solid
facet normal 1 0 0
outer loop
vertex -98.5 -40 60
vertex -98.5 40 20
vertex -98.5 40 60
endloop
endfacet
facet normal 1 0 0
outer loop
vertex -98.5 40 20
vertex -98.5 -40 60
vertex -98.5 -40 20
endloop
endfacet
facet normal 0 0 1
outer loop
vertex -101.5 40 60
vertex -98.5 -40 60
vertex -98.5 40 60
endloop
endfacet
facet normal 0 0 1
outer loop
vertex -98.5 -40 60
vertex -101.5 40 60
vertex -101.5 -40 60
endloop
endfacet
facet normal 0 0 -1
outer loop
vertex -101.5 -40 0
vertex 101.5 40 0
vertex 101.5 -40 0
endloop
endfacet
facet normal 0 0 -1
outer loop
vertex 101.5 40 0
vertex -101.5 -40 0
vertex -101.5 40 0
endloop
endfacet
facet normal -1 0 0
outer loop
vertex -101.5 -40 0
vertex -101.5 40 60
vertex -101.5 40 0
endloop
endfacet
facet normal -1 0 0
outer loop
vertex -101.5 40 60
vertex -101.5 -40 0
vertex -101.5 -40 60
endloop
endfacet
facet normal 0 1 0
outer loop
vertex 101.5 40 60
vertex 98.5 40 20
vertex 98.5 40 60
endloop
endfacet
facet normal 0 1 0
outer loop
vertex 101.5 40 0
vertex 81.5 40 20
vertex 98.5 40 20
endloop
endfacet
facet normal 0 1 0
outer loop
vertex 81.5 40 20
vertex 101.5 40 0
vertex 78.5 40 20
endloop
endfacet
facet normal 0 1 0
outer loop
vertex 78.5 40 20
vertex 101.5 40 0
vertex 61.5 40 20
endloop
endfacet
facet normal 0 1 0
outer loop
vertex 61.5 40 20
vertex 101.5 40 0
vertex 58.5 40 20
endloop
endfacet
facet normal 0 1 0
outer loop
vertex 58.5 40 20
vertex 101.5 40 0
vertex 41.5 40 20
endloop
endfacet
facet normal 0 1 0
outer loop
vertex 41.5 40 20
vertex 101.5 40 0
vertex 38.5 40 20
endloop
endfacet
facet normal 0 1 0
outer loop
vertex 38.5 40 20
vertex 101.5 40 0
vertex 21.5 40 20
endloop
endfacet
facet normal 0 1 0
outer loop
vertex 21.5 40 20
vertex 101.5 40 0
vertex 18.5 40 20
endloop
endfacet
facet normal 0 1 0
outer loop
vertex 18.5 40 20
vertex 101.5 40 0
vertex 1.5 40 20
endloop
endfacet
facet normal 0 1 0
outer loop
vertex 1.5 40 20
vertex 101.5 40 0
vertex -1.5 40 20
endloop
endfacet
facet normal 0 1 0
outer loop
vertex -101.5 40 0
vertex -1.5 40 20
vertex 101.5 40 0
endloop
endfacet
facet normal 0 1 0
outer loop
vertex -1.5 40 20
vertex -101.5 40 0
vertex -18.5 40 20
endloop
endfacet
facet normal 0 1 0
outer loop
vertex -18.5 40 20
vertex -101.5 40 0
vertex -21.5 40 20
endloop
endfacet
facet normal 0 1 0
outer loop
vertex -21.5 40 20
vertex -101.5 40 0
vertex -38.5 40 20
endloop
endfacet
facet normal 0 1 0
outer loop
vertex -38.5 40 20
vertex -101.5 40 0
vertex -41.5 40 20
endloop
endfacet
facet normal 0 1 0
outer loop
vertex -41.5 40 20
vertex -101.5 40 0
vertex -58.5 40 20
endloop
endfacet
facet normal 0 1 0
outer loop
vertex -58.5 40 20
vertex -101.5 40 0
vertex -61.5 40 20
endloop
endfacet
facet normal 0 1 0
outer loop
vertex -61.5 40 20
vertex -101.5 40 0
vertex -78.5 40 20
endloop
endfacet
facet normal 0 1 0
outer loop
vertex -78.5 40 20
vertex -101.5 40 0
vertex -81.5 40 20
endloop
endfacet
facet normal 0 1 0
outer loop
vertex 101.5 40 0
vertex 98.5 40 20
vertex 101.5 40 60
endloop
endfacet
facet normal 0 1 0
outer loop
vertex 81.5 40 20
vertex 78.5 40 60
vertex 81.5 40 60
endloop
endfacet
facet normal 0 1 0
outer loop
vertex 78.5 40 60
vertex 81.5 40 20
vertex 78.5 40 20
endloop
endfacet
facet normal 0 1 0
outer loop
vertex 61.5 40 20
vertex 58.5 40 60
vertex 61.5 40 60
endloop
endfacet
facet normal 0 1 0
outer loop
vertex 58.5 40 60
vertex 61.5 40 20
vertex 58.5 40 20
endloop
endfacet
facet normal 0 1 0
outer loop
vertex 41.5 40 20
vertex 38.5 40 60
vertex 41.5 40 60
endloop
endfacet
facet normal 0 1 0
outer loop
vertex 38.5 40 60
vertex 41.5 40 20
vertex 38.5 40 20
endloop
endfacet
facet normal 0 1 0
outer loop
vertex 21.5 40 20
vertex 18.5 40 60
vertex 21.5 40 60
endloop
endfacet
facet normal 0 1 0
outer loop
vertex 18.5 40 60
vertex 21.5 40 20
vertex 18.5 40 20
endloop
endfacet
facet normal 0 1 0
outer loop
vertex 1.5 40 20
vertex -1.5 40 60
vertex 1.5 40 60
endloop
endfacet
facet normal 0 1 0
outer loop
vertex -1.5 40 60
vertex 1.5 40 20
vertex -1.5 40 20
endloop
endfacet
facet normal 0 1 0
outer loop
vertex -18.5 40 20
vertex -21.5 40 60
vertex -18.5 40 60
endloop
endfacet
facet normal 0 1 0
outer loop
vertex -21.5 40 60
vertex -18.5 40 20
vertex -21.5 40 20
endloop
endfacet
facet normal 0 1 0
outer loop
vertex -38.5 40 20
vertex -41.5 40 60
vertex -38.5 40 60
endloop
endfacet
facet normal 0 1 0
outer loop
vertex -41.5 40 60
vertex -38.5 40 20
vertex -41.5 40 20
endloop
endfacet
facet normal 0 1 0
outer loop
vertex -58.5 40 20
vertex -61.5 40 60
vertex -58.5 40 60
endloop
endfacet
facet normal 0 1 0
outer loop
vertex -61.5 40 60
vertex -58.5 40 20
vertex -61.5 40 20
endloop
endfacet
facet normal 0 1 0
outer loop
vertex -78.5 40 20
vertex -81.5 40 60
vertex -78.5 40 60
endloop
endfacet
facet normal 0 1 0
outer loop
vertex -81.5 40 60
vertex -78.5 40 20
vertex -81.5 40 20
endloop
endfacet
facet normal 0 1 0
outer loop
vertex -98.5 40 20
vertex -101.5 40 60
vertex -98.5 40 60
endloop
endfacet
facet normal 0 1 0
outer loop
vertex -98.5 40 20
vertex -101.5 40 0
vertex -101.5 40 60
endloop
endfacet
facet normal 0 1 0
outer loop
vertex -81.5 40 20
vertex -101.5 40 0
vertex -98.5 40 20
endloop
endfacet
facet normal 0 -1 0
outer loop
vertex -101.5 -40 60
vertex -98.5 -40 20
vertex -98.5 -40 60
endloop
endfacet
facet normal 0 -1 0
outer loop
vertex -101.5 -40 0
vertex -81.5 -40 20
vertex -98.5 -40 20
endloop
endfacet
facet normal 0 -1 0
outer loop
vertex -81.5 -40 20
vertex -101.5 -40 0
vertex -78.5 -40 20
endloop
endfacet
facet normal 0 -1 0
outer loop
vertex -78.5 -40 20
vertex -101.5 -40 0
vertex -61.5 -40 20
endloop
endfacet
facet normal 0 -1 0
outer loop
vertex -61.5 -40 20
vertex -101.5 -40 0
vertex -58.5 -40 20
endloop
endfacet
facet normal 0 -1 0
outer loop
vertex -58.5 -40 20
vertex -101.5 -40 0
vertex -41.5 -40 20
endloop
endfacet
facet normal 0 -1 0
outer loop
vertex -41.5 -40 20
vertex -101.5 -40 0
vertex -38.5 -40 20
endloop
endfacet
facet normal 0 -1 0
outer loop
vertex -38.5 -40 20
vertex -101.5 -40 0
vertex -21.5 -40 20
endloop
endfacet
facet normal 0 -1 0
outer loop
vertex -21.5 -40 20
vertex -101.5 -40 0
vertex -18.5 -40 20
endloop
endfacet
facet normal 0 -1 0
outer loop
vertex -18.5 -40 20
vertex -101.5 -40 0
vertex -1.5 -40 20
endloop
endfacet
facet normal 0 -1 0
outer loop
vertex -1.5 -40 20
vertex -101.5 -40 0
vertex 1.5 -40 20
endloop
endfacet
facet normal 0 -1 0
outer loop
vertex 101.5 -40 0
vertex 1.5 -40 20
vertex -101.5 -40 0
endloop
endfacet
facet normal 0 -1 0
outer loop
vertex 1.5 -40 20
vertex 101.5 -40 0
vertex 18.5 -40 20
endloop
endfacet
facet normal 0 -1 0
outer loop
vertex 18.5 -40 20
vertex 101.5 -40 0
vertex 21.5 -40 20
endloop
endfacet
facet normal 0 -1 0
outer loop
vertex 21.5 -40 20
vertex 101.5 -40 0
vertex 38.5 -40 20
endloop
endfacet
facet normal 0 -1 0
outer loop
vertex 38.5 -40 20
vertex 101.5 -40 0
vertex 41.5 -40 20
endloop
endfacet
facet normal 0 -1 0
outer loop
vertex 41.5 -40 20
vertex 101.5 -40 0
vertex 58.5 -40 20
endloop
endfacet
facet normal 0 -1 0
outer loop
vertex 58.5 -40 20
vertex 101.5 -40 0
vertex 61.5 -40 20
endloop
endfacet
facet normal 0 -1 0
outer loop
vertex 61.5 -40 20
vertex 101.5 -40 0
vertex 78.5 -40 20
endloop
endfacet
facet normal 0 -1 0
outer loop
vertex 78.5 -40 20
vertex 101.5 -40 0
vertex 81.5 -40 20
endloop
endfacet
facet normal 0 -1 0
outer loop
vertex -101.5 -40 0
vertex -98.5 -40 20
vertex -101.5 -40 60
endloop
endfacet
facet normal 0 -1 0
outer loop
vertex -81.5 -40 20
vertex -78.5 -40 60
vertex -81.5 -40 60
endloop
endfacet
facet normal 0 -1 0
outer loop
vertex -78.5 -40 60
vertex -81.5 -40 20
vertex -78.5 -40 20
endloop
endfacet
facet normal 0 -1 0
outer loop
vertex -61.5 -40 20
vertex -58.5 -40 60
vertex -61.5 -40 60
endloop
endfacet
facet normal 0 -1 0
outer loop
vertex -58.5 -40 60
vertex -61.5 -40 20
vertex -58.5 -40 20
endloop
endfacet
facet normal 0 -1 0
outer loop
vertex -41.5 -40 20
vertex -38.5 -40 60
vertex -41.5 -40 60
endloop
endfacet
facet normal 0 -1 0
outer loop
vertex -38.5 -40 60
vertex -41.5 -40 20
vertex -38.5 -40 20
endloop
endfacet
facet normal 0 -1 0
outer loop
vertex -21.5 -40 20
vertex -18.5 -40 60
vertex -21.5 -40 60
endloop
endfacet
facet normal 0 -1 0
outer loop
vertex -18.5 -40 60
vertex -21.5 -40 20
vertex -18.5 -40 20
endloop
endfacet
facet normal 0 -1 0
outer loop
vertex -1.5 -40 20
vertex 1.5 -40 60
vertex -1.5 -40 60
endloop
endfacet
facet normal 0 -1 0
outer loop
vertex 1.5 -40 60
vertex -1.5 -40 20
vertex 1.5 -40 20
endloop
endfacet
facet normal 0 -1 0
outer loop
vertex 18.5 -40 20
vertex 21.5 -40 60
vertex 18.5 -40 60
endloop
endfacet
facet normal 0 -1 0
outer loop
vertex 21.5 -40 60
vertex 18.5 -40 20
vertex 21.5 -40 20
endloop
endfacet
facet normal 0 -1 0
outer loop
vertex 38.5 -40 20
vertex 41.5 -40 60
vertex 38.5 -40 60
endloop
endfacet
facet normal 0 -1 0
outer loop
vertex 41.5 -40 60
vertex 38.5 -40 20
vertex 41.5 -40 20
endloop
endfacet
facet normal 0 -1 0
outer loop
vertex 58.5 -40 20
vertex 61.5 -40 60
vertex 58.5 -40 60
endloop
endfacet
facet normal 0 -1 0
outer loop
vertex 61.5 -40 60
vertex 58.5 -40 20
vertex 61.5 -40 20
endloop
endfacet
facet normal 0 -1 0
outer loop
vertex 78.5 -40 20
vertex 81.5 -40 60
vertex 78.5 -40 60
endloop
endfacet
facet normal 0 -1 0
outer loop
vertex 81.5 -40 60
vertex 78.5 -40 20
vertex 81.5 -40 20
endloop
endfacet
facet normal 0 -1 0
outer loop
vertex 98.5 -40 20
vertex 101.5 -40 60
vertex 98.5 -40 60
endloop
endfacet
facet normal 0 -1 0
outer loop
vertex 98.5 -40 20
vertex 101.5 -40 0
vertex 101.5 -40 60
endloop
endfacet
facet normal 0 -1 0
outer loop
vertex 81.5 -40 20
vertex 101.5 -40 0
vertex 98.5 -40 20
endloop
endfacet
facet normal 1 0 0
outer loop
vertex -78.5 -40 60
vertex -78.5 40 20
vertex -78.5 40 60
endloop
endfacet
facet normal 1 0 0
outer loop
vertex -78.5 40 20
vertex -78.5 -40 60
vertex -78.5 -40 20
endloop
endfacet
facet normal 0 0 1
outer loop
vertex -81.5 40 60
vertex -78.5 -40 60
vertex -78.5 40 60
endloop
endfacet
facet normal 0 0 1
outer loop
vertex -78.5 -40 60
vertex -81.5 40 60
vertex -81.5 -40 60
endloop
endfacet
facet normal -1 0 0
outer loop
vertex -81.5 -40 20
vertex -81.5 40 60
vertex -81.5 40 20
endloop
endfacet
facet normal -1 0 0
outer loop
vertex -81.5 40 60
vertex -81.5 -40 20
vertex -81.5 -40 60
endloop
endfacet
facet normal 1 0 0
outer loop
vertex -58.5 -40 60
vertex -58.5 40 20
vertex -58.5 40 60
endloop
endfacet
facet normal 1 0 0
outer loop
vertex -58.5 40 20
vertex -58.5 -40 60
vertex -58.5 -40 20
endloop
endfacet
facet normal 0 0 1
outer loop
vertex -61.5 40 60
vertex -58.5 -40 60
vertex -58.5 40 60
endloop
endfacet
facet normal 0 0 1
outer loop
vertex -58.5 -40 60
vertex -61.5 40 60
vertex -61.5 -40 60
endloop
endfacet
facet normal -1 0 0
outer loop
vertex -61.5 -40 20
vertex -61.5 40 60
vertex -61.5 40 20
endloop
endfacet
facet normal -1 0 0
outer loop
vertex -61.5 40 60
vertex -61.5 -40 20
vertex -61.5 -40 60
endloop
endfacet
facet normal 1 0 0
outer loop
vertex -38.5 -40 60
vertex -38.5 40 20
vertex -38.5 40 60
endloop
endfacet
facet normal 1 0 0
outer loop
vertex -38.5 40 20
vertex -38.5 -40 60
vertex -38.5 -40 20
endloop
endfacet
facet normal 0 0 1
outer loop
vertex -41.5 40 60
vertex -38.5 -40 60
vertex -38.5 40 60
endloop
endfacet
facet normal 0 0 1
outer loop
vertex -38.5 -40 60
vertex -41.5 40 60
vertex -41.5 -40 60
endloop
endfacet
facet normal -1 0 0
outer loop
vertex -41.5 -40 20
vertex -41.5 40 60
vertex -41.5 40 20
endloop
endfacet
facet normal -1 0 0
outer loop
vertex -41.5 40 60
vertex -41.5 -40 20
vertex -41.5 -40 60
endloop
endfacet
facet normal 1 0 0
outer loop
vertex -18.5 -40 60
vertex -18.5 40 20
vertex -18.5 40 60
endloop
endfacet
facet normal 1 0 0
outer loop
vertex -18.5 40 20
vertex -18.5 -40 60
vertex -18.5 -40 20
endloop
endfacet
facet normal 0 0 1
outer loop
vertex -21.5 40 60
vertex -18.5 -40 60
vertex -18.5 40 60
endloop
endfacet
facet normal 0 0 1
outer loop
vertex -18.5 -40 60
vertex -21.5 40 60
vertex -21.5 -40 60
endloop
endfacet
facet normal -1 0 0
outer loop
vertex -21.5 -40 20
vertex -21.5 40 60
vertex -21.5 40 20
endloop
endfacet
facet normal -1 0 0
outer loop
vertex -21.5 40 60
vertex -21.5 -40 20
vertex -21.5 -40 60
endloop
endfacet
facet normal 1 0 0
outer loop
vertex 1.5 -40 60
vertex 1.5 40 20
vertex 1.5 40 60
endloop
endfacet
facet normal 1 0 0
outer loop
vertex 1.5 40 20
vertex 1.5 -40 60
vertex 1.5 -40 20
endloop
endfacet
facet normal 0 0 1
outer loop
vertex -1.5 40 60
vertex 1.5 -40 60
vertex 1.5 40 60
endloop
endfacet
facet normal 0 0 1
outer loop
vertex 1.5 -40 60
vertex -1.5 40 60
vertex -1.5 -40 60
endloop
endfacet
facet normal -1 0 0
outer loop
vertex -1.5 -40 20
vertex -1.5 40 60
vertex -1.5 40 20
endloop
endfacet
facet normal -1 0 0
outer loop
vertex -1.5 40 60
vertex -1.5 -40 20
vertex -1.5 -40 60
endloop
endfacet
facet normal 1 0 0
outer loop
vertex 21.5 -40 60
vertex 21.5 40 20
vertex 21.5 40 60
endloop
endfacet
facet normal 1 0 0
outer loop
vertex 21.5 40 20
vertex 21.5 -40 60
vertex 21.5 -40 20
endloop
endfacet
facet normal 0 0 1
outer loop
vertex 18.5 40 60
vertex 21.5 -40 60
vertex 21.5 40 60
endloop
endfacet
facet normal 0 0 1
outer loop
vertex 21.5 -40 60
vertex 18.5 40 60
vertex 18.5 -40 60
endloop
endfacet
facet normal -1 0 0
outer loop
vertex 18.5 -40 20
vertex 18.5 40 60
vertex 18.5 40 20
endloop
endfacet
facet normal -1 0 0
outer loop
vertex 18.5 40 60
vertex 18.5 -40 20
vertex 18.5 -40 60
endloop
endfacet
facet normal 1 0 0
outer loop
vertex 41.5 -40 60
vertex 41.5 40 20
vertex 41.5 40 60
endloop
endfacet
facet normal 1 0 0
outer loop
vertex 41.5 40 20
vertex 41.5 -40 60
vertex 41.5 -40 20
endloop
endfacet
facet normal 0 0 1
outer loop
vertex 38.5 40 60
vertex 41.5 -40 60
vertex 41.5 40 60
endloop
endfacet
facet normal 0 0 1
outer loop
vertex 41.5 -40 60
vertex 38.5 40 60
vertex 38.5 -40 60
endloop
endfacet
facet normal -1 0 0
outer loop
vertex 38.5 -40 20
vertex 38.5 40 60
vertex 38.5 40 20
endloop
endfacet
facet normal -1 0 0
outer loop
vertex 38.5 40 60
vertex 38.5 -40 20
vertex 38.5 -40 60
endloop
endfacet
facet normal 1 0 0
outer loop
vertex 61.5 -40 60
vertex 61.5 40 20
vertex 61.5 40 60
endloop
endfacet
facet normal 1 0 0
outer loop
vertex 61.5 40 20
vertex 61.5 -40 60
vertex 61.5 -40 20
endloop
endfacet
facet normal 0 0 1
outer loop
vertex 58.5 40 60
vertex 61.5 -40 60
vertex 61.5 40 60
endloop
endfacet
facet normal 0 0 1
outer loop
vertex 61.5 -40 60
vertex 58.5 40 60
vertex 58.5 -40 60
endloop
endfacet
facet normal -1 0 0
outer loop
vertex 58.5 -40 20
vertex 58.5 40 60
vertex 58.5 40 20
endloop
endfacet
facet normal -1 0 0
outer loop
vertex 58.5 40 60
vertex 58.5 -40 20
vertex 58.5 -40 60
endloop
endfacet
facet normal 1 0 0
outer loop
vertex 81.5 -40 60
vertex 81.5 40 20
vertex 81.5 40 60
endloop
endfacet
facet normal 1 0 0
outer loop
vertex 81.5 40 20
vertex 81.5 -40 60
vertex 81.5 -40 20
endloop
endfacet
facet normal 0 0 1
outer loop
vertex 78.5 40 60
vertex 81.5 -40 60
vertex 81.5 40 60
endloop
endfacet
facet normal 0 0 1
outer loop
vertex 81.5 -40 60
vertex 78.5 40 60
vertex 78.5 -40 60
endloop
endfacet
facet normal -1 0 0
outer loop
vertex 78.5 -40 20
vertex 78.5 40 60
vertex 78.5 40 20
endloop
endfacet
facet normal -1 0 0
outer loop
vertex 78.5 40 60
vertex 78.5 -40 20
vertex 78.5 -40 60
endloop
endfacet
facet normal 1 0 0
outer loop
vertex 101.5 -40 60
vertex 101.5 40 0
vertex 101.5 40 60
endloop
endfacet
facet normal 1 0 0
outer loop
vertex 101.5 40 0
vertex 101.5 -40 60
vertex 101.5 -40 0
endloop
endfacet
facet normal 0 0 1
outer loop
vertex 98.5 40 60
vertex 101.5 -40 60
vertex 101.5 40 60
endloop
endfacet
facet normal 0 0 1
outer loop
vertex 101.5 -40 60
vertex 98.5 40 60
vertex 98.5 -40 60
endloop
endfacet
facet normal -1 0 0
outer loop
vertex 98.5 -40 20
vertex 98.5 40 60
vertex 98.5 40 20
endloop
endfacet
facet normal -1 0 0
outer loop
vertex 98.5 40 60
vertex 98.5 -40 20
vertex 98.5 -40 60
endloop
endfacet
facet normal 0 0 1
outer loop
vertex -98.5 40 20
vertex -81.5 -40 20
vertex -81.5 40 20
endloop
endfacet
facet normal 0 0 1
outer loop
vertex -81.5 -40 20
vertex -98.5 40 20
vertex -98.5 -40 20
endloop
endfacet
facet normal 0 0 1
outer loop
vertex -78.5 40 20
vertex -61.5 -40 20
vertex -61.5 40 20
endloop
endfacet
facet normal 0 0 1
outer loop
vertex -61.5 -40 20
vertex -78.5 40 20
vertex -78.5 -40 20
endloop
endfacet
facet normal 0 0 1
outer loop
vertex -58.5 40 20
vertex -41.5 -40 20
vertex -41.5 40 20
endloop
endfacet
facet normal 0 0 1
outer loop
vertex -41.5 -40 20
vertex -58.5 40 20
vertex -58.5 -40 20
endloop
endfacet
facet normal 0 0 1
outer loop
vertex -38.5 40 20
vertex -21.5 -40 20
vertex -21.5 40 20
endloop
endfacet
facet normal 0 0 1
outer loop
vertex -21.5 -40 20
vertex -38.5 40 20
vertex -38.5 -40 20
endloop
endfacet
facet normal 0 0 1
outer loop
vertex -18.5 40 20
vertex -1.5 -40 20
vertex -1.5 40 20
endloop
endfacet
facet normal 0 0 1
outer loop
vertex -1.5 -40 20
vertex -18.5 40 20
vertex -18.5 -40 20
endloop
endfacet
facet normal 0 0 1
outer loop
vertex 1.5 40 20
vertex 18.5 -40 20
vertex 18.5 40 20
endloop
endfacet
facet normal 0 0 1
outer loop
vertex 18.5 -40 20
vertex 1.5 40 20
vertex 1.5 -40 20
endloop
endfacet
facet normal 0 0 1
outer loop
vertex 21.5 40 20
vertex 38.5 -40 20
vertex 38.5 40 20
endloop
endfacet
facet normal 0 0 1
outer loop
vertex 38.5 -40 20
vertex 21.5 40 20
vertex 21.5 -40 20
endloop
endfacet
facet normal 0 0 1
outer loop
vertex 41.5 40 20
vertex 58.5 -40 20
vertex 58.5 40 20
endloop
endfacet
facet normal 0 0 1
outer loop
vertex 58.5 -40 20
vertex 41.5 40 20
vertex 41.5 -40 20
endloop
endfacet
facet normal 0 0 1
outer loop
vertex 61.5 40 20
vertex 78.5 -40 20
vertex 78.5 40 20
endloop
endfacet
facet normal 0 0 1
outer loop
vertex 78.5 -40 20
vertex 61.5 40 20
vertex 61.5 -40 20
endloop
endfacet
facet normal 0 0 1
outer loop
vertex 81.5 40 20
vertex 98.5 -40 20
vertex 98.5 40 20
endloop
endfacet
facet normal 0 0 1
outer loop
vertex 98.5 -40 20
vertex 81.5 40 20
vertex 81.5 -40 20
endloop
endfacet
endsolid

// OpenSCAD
// 10-dish rack: 203 x 80 x 20 base, 11 dividers, 10 slots, X-axis cradle
$fn = 64;

// Base block dimensions
base_L = 203;   // length along X
base_W = 80;    // width along Y
base_H = 20;    // height along Z

// Divider plates
div_t   = 3;    // thickness along X
div_H   = 60;   // height above z = 0
div_W   = 80;   // full base width along Y
div_xs  = [-100, -80, -60, -40, -20, 0, 20, 40, 60, 80, 100];

// Curved cradle (dish rim) cutter
crad_R  = 46;   // radius of the dish rim
crad_cy = 0;    // axis Y position
crad_cz = 52;   // axis Z position  (bottoms out at z = 6)
crad_L  = 203;  // full length along X

// Build the solid: base + 11 divider plates, then remove the cradle
// (the cradle is NOT cut through the dividers, so it is subtracted
//  from the base only)
module base_and_dividers() { union() {
    // Base block, centred on origin in X and Y, resting on z = 0
    translate([-base_L/2, -base_W/2, 0])
        cube([base_L, base_W, base_H]);

    // Eleven divider plates rising from z = 0 to z = 60
    for (dx = div_xs)
        translate([dx - div_t/2, -div_W/2, 0])
            cube([div_t, div_W, div_H]);
} }

// Cradle cutter: a cylinder of radius 46 whose axis runs along X
// (rotate 90 about Y to align the cylinder axis with X), centred at
// y = 0, z = 52, spanning the full base length.
module cradle_cutter() { rotate([90, 0, 0])
    translate([0, crad_cy, crad_cz])
    cylinder(h = crad_L, r = crad_R, $fn = $fn); }

// Final part: cradle cut from the base only (dividers stay solid)
difference() {
    base_and_dividers();
    cradle_cutter();
}
